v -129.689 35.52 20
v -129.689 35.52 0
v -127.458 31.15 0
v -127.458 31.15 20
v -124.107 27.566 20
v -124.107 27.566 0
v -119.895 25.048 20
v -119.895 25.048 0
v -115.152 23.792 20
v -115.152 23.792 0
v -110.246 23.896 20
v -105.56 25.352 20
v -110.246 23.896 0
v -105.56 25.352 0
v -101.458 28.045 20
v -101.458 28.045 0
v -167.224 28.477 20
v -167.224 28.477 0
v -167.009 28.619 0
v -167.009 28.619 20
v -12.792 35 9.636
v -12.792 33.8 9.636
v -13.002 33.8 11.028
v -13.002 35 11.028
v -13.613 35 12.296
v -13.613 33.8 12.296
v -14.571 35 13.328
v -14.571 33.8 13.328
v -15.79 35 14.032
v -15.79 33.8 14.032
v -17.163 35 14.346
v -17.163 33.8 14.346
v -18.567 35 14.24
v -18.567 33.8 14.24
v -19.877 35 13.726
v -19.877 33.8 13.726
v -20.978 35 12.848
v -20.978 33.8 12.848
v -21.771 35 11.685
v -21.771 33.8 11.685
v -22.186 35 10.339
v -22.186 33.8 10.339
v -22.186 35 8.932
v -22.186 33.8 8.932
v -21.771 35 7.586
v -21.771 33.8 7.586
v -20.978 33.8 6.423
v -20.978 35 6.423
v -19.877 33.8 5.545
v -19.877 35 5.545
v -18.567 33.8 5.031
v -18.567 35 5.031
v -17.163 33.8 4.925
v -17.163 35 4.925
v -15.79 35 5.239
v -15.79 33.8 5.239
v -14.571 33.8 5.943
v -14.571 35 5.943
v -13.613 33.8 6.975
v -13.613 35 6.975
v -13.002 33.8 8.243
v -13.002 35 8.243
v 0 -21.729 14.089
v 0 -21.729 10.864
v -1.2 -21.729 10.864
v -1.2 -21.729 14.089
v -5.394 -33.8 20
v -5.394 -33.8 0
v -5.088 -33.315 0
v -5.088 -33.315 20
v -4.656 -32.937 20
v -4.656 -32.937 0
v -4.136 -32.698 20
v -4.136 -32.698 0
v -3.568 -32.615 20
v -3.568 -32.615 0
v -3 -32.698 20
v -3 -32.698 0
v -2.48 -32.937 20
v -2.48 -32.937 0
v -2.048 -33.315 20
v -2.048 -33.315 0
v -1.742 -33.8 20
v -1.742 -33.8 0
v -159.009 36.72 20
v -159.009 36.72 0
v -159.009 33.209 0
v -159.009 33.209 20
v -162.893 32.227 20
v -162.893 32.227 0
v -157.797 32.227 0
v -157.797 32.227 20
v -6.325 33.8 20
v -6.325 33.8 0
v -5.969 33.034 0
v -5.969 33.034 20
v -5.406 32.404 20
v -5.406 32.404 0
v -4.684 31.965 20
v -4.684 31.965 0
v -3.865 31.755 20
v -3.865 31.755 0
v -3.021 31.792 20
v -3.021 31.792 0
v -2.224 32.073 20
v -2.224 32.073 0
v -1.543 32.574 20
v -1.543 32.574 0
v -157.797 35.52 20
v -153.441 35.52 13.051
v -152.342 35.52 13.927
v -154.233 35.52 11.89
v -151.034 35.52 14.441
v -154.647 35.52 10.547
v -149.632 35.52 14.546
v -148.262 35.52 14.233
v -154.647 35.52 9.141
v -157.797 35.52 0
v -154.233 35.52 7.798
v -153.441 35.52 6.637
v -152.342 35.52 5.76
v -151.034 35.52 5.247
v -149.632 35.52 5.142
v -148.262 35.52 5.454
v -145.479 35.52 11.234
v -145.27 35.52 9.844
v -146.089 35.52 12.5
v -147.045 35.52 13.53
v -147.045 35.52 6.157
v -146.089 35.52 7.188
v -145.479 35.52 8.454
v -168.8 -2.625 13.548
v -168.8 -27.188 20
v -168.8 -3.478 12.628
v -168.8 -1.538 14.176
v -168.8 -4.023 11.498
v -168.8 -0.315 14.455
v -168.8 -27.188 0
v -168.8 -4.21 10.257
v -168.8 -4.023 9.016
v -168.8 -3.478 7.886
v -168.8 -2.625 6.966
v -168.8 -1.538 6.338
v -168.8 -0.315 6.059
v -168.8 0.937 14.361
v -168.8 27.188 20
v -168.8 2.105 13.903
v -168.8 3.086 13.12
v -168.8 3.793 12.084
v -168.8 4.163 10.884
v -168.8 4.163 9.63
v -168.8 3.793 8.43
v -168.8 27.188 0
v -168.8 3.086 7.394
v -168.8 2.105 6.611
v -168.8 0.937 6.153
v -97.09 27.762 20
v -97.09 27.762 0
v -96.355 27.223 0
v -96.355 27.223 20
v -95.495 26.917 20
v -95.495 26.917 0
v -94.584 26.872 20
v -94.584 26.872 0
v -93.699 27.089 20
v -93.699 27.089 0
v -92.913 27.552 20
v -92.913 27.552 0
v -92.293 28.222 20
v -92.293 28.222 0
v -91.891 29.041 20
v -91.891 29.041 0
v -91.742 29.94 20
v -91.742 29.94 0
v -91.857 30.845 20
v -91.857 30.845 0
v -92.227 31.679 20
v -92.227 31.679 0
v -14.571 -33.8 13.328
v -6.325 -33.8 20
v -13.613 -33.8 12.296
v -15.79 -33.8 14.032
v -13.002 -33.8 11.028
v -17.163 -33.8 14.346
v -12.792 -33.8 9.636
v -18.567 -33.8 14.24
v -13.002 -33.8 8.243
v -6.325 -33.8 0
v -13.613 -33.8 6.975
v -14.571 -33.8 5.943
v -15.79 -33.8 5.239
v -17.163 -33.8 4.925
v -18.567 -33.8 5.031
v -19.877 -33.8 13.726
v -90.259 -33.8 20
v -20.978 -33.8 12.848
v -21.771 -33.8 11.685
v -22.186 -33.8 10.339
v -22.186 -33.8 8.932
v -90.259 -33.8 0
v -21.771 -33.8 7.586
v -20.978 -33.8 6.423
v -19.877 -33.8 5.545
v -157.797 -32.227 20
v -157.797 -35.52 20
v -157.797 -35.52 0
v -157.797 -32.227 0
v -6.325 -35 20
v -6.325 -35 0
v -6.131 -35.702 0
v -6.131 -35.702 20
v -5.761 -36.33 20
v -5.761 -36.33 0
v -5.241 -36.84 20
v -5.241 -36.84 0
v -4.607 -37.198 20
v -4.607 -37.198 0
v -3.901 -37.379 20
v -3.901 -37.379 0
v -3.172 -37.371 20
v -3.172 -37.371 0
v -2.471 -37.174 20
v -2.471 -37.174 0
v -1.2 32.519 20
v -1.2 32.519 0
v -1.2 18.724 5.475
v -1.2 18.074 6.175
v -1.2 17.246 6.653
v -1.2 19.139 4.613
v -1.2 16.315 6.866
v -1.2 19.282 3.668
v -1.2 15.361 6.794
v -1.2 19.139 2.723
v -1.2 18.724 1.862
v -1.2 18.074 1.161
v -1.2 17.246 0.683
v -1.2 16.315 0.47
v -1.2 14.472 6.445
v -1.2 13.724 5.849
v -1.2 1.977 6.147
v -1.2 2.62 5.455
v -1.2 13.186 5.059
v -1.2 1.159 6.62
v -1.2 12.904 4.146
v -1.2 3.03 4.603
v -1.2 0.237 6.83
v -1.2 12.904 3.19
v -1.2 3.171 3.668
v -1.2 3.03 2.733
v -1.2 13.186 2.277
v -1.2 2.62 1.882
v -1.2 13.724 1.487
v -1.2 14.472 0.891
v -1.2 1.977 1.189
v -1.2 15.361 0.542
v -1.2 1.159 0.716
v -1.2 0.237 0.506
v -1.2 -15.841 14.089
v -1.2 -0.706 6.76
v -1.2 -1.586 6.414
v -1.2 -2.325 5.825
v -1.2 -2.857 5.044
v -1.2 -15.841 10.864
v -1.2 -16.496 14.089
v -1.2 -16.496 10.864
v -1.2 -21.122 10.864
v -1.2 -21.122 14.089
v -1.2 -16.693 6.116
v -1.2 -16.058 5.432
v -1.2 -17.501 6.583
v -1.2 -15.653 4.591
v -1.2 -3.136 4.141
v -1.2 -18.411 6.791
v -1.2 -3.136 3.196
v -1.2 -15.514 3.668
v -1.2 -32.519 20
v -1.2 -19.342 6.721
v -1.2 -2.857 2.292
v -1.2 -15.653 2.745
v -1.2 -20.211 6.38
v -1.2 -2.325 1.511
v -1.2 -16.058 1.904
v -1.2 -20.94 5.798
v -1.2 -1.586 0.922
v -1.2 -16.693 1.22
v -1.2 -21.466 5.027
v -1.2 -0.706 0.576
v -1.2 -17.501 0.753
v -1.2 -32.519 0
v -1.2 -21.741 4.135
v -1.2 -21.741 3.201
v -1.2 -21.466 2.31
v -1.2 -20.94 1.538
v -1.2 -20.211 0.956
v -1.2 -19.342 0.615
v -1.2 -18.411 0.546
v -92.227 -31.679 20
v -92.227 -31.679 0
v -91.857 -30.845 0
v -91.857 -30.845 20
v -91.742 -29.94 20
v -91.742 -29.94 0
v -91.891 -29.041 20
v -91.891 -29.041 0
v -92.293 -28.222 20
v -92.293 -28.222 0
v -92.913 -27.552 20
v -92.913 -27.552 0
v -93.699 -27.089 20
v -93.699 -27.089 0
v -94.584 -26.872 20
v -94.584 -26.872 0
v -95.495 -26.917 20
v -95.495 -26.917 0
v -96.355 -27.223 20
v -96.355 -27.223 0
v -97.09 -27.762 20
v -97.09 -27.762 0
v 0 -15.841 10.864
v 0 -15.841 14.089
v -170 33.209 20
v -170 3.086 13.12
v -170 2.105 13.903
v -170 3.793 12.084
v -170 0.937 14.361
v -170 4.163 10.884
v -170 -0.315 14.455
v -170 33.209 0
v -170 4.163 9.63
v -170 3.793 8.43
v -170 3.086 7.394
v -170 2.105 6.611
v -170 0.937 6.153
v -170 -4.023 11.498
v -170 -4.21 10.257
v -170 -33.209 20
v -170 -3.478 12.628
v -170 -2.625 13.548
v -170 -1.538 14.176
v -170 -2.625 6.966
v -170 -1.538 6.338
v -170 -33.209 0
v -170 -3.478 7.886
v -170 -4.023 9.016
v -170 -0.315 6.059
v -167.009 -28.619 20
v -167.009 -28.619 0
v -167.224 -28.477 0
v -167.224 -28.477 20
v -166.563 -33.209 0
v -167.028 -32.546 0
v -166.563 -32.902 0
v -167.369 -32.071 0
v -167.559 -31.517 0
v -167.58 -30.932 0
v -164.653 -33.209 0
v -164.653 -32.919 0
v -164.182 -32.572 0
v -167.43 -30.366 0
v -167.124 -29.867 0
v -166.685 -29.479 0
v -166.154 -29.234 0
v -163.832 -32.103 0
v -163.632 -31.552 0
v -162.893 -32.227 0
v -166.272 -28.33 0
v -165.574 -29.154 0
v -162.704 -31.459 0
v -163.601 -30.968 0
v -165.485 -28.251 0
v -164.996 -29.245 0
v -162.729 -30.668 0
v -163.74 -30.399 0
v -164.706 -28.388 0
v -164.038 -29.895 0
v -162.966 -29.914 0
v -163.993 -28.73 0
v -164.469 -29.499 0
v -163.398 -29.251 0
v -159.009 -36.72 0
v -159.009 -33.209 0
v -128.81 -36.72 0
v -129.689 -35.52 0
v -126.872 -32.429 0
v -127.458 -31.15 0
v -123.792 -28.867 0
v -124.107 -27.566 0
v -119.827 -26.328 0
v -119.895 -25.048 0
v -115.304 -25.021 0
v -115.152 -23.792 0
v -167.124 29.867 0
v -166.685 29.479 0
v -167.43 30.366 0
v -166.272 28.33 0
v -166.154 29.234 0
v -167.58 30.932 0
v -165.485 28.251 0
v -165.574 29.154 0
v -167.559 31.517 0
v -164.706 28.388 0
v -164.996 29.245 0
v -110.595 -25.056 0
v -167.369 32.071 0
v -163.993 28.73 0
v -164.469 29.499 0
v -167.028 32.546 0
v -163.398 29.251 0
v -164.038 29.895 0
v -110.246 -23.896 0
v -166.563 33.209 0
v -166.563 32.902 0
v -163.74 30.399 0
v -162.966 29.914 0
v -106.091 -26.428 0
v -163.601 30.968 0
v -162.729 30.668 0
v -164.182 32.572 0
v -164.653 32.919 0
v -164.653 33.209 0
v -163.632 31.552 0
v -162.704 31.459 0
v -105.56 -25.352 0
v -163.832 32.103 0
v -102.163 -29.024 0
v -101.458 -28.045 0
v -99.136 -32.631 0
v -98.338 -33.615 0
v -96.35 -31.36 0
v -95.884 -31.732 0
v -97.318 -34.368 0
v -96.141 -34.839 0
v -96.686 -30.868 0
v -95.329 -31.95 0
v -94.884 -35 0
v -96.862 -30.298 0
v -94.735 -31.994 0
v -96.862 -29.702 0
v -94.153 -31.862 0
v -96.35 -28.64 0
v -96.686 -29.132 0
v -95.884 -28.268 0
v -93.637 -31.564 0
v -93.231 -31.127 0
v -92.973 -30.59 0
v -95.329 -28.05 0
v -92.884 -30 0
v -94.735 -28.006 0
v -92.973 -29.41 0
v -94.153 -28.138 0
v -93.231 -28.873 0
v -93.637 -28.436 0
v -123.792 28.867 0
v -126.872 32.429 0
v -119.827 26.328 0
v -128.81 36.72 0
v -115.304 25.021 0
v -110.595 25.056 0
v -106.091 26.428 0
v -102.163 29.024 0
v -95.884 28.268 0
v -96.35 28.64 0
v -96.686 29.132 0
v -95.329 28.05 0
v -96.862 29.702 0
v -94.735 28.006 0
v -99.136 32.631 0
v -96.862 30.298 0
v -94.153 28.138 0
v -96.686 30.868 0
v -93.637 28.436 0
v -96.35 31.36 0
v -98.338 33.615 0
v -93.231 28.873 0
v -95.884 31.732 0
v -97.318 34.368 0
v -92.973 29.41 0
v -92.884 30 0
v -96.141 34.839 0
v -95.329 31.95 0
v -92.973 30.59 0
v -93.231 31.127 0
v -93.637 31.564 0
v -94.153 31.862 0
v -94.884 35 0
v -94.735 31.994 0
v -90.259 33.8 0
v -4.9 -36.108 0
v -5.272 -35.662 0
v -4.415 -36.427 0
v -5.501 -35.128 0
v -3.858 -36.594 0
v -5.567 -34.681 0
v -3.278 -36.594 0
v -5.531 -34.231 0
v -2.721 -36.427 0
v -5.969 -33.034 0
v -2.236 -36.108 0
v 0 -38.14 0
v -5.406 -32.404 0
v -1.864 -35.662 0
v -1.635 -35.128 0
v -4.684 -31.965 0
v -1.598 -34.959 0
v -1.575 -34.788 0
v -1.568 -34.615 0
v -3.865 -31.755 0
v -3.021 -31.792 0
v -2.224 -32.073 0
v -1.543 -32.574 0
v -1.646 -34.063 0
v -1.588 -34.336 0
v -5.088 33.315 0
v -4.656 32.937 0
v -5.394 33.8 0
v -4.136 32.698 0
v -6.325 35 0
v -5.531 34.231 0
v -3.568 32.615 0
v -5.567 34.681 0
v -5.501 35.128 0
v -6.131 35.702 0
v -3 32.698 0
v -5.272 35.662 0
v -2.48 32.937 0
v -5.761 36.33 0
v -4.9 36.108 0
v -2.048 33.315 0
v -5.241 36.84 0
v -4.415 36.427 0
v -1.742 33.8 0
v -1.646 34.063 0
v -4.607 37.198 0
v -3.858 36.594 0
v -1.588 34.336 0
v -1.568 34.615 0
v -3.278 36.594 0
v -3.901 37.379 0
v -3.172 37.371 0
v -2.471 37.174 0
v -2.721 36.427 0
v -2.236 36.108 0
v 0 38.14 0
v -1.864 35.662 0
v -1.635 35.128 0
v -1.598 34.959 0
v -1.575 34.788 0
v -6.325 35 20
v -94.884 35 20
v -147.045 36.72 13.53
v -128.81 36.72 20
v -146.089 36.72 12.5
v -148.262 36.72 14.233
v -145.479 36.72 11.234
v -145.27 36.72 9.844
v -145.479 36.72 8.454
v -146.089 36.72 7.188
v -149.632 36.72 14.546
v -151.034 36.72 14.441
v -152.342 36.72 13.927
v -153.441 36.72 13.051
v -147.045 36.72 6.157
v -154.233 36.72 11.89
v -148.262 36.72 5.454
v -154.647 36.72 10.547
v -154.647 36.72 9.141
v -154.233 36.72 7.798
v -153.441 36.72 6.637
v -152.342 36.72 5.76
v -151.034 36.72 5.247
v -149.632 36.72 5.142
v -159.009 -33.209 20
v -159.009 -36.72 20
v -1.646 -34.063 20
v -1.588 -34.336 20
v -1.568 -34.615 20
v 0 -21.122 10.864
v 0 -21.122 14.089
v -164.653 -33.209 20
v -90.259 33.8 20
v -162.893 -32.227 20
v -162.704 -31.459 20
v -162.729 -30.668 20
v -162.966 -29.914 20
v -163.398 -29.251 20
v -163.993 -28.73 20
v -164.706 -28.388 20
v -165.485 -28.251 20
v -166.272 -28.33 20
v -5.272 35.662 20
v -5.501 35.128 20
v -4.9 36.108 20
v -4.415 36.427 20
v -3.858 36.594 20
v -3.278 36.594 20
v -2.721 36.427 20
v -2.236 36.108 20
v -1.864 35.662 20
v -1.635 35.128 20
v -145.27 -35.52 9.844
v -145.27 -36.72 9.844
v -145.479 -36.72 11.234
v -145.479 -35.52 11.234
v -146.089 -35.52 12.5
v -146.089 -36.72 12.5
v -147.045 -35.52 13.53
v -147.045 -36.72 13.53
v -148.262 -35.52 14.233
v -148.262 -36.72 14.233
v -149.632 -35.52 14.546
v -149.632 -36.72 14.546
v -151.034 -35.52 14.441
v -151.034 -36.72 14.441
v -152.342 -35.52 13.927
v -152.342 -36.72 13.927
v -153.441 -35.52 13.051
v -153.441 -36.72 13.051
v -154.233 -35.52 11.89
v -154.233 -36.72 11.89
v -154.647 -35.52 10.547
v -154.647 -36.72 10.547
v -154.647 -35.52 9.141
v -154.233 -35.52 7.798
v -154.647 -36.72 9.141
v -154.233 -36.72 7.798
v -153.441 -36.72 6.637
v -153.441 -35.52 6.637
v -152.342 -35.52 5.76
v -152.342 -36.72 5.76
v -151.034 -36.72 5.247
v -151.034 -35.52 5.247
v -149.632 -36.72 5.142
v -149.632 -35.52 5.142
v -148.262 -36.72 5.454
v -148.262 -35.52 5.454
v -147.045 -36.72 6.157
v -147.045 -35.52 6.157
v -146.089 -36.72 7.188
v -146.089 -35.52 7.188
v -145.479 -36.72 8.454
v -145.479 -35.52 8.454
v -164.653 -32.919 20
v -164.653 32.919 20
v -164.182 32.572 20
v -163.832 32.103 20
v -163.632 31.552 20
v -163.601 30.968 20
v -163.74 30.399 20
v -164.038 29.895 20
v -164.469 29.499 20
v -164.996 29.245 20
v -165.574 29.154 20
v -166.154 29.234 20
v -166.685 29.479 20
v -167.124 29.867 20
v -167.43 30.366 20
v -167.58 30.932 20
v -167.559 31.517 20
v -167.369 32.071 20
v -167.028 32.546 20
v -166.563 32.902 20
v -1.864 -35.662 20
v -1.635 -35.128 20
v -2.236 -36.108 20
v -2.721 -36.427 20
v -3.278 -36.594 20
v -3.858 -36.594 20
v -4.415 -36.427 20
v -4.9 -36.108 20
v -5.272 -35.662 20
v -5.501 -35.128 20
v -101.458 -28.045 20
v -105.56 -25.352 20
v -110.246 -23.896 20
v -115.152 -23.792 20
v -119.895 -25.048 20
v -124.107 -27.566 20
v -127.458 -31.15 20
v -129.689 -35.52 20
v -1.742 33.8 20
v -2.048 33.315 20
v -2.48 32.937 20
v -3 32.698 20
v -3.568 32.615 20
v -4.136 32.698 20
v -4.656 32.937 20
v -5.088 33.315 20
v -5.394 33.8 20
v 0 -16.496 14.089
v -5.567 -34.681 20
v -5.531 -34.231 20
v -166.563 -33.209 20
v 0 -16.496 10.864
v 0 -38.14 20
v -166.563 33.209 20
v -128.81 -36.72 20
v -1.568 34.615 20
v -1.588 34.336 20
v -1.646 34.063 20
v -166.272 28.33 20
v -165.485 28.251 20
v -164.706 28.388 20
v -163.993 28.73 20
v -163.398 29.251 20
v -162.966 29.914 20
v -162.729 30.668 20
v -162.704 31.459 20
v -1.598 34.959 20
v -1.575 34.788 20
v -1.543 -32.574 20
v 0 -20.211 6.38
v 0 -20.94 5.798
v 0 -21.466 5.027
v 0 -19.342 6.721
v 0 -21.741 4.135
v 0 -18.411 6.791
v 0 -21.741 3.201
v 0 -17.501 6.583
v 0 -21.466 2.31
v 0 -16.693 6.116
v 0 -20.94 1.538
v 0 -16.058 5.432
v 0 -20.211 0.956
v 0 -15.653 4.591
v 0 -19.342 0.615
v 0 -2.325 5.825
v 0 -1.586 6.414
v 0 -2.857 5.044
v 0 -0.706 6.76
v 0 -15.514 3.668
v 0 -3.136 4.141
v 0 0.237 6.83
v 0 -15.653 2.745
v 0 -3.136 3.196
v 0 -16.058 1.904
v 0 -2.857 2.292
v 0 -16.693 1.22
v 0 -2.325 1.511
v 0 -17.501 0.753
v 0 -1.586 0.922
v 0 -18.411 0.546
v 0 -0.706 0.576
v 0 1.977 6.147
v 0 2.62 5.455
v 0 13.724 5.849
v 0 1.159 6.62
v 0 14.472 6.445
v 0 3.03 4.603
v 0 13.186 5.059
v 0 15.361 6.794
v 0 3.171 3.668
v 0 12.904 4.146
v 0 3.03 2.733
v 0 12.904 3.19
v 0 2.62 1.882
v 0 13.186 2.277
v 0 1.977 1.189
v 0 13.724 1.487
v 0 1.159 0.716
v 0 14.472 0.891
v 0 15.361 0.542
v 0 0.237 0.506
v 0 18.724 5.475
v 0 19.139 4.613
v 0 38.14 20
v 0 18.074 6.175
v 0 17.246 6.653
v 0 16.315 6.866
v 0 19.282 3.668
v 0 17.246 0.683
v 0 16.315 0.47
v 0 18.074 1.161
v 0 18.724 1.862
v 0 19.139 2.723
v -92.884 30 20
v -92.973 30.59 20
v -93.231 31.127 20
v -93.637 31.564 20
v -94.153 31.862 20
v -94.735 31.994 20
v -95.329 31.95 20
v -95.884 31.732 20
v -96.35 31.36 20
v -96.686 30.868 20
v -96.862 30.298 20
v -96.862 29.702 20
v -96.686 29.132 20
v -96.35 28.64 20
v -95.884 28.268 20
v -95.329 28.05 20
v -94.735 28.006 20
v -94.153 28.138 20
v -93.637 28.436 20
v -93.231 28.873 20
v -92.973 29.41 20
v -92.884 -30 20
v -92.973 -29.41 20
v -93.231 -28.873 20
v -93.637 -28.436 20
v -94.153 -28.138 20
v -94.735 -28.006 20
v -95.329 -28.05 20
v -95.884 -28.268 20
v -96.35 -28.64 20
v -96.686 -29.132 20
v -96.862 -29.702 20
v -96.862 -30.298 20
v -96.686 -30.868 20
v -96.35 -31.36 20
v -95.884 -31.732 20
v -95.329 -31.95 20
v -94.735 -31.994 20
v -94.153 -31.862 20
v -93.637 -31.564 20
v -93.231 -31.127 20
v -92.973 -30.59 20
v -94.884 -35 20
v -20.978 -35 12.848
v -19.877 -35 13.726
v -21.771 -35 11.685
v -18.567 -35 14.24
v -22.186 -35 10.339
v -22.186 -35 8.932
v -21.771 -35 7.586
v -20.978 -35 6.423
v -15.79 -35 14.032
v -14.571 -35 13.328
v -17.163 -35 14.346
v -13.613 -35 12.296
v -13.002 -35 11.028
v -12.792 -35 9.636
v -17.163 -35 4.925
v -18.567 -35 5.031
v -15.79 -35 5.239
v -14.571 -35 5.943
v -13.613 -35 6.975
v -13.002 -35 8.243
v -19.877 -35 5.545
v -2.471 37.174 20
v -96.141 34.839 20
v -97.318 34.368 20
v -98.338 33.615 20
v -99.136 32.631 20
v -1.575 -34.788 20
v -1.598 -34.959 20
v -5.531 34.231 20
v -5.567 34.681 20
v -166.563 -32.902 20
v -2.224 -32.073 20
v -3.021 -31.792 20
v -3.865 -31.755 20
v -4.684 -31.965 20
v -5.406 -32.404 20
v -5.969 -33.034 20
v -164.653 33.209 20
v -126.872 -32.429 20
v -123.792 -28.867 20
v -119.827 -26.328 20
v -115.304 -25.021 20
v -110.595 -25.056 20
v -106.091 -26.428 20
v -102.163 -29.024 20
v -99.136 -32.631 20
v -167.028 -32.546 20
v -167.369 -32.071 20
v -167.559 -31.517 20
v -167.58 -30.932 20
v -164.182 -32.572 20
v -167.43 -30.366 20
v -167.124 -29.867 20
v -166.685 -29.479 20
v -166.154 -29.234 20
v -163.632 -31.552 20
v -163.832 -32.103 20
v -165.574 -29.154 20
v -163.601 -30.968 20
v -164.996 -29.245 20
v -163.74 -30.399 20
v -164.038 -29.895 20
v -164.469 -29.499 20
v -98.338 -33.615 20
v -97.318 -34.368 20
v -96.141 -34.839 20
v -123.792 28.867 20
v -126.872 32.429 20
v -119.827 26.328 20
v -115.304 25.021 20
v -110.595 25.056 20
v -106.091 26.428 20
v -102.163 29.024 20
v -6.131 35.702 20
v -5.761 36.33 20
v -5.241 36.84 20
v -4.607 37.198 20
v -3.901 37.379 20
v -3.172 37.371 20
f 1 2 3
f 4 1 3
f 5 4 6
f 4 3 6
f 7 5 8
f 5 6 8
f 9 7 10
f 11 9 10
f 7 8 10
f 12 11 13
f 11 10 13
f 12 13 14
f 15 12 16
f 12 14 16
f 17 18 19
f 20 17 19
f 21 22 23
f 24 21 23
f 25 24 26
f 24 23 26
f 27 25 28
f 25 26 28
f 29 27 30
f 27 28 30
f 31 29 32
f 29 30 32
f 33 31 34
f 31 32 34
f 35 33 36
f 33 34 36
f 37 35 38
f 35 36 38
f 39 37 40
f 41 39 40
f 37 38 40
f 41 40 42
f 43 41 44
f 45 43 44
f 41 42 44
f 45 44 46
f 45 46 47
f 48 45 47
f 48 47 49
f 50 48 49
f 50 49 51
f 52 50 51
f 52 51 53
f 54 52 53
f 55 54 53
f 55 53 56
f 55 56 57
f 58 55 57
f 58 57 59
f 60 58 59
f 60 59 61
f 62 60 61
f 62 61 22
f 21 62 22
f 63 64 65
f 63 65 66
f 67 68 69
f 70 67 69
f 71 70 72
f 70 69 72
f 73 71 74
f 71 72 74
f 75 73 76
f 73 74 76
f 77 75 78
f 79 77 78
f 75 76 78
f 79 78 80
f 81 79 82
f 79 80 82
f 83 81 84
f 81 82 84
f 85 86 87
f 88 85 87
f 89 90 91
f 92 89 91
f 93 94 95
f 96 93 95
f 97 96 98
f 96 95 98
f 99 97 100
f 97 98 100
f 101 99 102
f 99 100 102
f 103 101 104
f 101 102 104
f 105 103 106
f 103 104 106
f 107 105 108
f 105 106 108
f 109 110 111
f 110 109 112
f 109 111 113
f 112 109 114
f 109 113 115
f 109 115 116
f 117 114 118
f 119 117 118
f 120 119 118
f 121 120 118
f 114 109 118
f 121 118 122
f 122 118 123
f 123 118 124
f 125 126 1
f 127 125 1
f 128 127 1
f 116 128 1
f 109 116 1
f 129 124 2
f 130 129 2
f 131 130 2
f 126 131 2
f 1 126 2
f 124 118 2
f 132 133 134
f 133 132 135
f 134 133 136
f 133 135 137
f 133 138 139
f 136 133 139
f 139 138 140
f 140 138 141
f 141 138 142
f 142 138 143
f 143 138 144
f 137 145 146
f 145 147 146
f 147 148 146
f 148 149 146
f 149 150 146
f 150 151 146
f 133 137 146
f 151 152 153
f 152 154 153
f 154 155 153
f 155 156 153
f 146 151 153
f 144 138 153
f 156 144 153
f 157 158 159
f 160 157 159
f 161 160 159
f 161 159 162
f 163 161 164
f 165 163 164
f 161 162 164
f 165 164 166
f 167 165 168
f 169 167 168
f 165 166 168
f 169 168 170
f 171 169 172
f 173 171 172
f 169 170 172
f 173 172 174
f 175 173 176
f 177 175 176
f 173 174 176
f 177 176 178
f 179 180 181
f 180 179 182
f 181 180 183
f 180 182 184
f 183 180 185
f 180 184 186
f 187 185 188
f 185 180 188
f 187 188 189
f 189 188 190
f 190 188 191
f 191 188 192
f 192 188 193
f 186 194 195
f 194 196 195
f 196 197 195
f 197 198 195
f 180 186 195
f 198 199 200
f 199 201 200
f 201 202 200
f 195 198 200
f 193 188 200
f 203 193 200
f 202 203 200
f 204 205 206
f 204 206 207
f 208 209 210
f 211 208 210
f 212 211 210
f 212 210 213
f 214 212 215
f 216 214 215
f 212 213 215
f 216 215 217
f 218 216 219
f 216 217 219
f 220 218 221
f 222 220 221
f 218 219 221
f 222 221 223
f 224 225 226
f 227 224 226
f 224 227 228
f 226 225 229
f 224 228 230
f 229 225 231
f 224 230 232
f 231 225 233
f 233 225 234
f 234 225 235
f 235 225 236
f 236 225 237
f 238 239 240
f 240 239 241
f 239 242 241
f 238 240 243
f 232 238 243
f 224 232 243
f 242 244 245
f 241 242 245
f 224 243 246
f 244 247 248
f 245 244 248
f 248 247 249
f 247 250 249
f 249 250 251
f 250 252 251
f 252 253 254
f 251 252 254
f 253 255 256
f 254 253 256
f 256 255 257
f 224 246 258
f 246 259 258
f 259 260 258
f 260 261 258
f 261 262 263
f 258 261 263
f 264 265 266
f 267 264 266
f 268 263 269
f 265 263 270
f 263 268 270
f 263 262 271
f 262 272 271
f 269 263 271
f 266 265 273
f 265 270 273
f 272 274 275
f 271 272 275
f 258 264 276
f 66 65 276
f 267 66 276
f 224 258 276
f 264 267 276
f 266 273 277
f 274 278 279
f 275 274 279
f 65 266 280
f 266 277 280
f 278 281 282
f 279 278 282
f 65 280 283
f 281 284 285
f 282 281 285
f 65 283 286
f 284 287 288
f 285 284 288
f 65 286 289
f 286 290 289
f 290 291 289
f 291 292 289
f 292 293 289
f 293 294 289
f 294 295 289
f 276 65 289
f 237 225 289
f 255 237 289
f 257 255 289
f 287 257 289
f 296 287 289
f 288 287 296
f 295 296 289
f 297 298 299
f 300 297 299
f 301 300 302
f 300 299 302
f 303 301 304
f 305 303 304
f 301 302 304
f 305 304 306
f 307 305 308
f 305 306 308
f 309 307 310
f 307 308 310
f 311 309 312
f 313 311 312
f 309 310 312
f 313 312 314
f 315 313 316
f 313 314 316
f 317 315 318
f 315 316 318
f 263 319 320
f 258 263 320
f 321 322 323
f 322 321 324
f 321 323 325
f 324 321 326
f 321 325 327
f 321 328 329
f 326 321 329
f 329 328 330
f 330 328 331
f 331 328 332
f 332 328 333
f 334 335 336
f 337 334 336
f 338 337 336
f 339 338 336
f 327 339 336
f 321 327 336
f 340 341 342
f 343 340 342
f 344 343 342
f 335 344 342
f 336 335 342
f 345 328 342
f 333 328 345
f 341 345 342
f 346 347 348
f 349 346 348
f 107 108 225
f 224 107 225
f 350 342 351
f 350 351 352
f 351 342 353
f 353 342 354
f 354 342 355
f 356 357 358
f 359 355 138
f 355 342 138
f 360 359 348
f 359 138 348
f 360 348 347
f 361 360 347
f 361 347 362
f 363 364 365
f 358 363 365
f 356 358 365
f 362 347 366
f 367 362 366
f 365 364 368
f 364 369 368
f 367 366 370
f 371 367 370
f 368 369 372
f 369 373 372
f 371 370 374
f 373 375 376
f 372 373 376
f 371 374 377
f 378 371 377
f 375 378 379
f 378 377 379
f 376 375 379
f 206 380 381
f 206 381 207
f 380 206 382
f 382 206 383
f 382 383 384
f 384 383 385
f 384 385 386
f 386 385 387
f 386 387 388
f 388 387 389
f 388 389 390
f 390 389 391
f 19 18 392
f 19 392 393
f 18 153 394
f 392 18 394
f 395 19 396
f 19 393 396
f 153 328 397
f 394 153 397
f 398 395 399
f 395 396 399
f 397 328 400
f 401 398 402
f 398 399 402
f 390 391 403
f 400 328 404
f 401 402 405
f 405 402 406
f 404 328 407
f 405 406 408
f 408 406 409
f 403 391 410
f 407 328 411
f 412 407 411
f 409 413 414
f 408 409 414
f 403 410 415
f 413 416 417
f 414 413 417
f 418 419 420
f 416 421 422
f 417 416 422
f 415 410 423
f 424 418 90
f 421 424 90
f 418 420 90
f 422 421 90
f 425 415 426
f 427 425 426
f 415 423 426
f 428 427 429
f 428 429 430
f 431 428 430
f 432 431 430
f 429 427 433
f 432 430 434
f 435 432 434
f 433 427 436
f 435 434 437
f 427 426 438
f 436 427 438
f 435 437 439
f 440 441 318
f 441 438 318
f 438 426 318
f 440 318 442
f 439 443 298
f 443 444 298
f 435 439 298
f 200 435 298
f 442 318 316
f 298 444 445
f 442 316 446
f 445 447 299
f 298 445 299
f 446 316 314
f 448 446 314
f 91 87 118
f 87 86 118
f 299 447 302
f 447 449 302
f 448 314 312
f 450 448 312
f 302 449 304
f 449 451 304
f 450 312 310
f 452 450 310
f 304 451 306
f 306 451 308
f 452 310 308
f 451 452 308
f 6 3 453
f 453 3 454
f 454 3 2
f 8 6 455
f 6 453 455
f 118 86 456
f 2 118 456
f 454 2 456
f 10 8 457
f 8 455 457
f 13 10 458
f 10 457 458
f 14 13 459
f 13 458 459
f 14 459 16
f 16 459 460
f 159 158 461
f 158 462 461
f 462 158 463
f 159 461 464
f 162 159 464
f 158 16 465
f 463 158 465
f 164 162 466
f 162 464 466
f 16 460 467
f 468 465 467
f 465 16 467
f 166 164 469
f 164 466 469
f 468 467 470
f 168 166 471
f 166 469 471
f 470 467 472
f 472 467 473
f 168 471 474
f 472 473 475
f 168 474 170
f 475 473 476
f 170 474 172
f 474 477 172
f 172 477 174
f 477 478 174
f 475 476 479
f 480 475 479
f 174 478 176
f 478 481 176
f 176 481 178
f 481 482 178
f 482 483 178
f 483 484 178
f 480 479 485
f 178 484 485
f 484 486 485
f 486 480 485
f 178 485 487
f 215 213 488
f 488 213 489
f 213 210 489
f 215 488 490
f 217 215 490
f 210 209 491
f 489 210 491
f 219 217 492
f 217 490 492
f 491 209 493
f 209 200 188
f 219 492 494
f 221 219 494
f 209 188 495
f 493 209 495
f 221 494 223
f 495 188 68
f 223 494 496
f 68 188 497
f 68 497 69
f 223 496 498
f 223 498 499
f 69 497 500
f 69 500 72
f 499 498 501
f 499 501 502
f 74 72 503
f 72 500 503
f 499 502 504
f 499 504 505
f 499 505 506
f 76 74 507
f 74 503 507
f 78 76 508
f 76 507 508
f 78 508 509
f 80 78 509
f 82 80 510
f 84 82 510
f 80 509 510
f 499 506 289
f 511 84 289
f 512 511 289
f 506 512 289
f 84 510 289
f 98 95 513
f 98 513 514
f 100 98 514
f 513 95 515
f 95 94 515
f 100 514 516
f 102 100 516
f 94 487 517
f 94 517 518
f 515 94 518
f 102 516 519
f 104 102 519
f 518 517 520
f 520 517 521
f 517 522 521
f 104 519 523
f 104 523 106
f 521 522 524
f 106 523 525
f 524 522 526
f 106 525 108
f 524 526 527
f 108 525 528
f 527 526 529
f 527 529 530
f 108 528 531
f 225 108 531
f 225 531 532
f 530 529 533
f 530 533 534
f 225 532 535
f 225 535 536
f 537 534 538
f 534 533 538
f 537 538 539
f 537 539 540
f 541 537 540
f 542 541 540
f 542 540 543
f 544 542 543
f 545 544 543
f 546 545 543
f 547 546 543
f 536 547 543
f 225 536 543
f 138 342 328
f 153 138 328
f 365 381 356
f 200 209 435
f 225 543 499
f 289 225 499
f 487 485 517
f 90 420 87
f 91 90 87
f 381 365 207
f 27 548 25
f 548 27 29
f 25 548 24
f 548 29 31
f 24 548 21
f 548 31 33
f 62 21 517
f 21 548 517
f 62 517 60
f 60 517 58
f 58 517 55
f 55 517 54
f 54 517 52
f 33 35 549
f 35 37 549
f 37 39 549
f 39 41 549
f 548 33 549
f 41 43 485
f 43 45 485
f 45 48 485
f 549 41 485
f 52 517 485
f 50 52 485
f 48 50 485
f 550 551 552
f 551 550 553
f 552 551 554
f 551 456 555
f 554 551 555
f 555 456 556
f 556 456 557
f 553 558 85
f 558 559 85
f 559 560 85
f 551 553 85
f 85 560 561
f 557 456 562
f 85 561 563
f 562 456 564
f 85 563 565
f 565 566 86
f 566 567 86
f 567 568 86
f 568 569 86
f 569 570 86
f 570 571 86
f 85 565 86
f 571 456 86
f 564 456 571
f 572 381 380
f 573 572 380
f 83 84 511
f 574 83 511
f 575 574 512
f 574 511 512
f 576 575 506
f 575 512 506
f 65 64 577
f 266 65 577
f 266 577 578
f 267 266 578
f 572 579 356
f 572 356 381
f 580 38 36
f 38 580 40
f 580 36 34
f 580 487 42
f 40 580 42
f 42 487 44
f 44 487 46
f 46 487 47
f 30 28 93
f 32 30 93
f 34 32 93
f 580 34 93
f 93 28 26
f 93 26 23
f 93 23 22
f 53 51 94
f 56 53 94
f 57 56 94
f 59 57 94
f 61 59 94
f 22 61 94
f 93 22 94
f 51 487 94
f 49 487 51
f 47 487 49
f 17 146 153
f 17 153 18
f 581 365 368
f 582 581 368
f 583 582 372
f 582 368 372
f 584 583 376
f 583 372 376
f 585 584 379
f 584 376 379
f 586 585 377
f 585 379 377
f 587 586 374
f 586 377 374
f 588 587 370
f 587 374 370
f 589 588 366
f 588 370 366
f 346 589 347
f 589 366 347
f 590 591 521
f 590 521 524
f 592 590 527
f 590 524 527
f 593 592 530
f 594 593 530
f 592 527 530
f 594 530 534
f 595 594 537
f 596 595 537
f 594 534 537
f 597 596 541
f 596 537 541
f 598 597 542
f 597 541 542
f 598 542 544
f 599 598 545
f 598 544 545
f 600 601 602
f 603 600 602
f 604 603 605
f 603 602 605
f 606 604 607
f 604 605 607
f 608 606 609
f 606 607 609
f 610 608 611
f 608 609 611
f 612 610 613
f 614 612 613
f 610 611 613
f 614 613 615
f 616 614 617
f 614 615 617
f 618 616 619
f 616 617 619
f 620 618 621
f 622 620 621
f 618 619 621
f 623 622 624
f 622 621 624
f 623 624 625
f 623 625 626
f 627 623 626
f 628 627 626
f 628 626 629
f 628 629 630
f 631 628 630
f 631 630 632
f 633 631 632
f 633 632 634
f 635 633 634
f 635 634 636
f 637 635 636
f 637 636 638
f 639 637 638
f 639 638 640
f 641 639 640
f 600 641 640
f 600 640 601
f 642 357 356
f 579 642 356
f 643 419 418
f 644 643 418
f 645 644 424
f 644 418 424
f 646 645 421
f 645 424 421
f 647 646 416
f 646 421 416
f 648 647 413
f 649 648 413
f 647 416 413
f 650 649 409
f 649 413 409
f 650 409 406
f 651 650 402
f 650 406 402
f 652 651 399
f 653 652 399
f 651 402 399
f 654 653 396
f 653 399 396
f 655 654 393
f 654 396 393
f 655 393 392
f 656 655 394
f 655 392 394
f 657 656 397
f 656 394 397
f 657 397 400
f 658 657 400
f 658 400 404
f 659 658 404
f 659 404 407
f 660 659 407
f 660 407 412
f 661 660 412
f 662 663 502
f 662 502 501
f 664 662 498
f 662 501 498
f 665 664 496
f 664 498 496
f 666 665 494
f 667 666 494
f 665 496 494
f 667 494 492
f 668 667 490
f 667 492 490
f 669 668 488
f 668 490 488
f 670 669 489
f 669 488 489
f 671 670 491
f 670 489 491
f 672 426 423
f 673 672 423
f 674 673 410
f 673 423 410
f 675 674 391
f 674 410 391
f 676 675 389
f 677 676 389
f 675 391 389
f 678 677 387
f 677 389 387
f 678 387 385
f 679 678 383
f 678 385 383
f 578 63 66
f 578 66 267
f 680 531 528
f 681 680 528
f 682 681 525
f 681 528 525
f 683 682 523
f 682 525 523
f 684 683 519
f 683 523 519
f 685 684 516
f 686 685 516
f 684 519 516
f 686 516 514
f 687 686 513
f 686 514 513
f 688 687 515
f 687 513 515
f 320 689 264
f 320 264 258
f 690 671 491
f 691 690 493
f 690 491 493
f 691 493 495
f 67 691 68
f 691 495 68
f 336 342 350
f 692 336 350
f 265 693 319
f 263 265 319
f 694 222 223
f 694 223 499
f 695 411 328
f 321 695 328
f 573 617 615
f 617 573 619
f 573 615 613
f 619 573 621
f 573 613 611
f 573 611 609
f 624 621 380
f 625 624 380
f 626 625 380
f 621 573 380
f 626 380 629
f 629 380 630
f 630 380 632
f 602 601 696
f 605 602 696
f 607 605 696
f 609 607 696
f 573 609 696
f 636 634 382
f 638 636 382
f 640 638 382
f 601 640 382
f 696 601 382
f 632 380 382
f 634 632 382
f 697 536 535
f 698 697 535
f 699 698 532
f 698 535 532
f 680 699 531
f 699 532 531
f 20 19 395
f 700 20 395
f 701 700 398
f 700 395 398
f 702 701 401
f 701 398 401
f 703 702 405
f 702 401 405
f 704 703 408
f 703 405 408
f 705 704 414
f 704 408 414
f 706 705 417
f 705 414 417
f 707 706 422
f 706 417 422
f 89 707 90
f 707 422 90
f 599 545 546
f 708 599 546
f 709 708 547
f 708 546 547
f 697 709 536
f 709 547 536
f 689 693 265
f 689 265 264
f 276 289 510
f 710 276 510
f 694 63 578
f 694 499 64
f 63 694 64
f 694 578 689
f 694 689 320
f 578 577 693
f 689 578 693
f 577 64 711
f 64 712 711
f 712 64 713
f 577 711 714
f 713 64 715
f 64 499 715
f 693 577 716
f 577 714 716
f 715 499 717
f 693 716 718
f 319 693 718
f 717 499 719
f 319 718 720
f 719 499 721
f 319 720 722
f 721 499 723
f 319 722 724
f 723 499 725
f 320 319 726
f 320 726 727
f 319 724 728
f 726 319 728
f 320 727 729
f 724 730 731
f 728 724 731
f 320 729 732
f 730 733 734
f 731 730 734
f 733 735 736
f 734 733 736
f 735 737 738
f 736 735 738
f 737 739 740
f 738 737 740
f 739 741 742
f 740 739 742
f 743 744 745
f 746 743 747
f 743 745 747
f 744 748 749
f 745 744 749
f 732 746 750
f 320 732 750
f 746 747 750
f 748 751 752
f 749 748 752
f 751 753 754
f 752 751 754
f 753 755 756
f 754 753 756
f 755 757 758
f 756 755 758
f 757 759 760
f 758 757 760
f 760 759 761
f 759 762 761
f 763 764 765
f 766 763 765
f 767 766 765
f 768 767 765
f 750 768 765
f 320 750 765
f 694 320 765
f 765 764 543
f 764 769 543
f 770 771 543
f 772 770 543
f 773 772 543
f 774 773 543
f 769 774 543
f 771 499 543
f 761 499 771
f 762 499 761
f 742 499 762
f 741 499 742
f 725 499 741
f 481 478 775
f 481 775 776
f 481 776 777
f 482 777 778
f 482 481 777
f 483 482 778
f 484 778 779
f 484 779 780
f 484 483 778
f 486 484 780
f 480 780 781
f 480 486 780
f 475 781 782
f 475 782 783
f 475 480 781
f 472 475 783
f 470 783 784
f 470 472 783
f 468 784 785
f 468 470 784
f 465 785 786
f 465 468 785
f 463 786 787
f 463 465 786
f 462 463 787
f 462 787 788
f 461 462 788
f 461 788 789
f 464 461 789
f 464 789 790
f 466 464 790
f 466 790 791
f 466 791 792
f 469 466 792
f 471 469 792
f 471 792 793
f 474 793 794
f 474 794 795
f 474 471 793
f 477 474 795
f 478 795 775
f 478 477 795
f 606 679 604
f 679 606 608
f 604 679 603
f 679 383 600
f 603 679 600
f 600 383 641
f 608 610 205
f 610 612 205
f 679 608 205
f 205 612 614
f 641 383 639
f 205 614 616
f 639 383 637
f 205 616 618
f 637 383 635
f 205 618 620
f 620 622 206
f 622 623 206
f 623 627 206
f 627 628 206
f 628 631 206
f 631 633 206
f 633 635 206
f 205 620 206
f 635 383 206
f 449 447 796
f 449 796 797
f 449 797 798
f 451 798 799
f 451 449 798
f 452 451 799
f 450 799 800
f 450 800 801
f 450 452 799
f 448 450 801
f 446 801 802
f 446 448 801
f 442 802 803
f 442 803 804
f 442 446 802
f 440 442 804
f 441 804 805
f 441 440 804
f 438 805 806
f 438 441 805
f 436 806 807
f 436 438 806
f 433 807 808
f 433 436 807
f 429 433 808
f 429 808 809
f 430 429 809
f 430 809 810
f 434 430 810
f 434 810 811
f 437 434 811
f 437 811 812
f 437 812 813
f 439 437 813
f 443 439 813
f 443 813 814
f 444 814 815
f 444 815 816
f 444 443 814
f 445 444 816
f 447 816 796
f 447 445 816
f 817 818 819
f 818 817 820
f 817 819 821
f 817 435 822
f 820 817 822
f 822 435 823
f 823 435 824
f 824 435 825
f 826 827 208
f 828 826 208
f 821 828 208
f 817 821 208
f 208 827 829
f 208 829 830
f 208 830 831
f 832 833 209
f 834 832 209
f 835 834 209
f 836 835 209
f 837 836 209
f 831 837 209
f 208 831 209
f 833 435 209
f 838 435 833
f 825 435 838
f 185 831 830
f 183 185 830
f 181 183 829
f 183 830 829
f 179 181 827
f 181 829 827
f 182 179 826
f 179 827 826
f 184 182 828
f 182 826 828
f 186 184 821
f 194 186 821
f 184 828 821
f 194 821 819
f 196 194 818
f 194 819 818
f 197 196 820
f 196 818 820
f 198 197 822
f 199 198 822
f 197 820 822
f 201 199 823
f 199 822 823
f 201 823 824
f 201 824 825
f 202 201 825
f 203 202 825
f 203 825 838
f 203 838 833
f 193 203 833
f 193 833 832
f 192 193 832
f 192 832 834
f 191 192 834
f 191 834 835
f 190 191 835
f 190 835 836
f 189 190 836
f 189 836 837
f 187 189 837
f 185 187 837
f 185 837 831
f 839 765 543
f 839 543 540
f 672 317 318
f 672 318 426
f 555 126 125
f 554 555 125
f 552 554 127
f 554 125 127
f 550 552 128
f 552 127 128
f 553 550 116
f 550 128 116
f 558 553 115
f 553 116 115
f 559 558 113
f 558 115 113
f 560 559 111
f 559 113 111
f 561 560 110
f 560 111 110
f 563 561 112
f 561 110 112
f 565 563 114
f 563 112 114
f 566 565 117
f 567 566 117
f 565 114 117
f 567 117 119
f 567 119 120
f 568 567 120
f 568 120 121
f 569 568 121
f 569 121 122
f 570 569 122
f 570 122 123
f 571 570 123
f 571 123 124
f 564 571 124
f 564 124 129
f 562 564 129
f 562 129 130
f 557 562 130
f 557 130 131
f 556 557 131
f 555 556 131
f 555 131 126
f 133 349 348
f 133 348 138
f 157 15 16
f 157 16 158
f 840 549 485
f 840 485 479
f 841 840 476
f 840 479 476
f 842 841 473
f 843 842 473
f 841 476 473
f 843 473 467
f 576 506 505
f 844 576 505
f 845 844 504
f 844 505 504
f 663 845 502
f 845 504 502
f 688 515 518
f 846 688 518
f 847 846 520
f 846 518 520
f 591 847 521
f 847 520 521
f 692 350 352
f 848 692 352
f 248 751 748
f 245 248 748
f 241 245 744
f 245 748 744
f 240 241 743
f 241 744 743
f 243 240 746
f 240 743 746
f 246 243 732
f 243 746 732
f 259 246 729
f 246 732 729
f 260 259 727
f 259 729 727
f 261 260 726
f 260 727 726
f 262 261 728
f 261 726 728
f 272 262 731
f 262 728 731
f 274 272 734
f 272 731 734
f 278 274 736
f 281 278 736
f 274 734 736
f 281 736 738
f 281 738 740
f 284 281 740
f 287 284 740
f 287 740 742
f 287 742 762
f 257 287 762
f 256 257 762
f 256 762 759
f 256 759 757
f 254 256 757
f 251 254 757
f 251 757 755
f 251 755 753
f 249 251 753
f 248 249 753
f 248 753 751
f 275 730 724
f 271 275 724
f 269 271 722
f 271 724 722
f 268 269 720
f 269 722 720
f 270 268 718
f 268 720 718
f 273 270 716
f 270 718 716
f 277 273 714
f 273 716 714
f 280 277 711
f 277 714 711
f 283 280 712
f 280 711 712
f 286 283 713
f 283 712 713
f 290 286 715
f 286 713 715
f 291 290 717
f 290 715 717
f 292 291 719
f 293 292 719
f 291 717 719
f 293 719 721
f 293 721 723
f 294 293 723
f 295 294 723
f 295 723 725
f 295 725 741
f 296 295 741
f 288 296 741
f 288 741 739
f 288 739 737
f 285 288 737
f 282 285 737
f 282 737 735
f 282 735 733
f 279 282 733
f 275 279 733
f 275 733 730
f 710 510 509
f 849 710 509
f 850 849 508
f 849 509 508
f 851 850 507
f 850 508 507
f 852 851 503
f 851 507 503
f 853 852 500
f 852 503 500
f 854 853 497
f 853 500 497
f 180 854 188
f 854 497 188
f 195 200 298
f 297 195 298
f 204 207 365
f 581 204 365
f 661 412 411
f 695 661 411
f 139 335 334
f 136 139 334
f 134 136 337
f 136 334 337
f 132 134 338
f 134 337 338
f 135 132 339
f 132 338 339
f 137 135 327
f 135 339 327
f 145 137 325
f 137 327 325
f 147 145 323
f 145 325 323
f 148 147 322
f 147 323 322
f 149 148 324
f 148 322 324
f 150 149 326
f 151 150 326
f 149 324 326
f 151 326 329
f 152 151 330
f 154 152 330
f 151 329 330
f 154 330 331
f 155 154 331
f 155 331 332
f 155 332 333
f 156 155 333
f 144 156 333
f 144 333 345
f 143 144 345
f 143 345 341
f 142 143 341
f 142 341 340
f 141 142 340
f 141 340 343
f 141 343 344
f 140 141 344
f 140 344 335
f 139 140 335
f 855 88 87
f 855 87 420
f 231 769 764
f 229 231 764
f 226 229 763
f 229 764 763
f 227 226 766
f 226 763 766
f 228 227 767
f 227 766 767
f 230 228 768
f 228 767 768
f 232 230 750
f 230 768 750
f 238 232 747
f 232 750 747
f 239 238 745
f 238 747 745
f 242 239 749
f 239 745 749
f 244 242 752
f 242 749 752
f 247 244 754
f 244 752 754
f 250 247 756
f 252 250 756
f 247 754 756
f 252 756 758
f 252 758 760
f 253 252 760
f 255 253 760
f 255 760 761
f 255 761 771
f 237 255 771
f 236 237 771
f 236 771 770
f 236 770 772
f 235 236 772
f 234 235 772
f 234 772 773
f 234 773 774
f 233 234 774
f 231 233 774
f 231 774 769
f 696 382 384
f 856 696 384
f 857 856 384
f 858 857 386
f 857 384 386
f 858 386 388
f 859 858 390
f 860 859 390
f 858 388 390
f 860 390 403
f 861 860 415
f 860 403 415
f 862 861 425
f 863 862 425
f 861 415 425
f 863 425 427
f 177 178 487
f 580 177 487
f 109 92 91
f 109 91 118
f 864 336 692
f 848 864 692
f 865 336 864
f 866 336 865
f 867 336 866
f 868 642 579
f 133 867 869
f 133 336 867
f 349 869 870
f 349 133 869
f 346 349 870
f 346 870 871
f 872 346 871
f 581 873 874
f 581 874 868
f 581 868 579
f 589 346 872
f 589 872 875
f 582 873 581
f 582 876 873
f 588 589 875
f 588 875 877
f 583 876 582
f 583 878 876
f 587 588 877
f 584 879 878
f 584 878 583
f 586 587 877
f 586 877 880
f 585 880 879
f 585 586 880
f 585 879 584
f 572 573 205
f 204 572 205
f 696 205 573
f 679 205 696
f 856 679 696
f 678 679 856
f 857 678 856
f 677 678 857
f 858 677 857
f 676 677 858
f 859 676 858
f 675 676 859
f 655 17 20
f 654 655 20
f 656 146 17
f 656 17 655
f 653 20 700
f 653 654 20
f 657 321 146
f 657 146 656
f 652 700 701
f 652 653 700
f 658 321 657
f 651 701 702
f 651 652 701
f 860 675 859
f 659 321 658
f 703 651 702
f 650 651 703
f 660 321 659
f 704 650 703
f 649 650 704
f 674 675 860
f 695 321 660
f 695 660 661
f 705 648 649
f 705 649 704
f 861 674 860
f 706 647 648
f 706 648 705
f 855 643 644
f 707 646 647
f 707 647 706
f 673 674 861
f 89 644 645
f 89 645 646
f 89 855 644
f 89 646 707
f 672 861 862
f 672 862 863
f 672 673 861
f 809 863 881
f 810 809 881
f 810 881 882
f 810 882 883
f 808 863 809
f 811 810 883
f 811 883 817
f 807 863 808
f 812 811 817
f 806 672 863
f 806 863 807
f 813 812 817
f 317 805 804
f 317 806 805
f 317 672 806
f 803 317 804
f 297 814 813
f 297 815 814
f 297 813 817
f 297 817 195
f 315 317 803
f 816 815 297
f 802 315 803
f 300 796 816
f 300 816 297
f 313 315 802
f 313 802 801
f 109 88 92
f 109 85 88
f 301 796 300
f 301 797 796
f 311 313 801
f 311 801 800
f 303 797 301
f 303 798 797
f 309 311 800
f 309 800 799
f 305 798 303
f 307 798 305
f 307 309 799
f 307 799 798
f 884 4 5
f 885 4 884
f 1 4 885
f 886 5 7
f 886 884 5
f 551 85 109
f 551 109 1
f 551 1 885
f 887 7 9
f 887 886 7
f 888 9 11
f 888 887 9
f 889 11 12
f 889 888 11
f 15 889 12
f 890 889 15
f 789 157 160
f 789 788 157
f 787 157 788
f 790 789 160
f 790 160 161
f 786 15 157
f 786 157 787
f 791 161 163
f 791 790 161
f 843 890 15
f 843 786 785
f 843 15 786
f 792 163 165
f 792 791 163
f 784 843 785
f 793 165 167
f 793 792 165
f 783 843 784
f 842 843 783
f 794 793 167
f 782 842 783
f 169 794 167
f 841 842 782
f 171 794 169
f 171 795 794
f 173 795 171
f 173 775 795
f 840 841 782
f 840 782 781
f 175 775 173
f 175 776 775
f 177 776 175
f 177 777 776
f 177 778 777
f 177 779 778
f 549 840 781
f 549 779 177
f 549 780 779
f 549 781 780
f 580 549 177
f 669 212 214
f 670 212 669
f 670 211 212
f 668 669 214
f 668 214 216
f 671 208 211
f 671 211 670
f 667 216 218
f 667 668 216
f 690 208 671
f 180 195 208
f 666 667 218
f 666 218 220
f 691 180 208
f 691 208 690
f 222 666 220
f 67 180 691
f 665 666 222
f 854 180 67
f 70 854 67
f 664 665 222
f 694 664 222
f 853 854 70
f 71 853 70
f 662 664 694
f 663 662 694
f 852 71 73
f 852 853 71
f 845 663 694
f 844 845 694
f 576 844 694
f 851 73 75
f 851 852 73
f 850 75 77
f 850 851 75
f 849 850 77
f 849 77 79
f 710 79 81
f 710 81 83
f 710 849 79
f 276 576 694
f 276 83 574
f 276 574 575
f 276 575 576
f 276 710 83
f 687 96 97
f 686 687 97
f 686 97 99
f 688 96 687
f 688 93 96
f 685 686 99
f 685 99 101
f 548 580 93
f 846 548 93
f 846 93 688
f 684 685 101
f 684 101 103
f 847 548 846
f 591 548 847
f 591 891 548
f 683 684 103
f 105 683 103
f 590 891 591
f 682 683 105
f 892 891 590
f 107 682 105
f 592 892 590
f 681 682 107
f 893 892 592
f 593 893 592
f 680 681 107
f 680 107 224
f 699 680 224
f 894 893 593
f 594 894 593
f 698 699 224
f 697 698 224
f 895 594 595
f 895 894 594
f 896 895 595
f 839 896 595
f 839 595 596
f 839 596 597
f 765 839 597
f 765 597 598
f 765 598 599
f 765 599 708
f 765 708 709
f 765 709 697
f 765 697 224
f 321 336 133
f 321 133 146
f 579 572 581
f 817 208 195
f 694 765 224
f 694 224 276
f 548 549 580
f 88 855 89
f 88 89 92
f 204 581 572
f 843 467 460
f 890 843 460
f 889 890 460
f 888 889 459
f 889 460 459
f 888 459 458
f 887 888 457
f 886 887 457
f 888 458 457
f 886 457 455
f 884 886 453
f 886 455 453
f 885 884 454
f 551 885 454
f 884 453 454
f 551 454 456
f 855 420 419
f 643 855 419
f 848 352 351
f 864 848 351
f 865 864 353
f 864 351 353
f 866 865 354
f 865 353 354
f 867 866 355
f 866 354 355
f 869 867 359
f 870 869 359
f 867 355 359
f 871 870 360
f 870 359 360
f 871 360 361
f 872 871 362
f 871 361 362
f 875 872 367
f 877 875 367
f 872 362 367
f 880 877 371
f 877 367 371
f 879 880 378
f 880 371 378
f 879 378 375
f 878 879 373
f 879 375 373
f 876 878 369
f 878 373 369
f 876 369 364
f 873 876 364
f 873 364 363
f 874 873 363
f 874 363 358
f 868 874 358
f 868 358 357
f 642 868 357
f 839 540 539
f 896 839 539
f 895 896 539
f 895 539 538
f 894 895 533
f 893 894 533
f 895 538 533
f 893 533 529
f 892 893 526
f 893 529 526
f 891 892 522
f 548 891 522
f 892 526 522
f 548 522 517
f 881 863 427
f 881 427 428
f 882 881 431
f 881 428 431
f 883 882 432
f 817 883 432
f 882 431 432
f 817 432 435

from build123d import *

# Parameters (mm, degrees)
F0_R     = 2
F1_DEPTH = 20
F2_R     = 4.7152449582
F2_R_2   = 4.7232891339
F3_DEPTH = 108
F4_R     = 4.2098088582
F5_DEPTH = 25
F6_R     = 3.1711780618
F6_R_2   = 3.2066806009
F6_R_3   = 3.1312270379
F6_W     = 0.6074849516
F6_H     = 3.2243365422
F6_W_2   = 0.6542131305
F7_DEPTH = 25


# Not quite as in the source:
# - a feature names something its author has since deleted; it is built from what else it names


with BuildPart() as f1:
    # F0 (on Top) → F1 (new body)
    with BuildSketch(Plane.XY):
        with BuildLine():
            Line((-164.65269916, 33.20941329), (-164.65269916, 32.9194632454))
            ThreePointArc((-164.65269916, 32.9194632454), (-165.5739976736, 29.1538786951), (-166.563206189, 32.902196247))
            Line((-166.563206189, 32.902196247), (-166.563206189, 33.20941329))
            Line((-166.563206189, 33.20941329), (-170, 33.20941329))
            Line((-170, 33.20941329), (-170, 0))
            Line((-170, 0), (-170, -33.20941329))
            Line((-170, -33.20941329), (-166.563206189, -33.20941329))
            Line((-166.563206189, -33.20941329), (-166.563206189, -32.902196247))
            ThreePointArc((-166.563206189, -32.902196247), (-165.5739976736, -29.1538786951), (-164.65269916, -32.9194632454))
            Line((-164.65269916, -32.9194632454), (-164.65269916, -33.20941329))
            Line((-164.65269916, -33.20941329), (-163.2265451578, -33.20941329))
            Line((-163.2265451578, -33.20941329), (-159.009280774, -33.20941329))
            Line((-159.009280774, -33.20941329), (-159.009280774, -36.7204154693))
            Line((-159.009280774, -36.7204154693), (-157.7970415085, -36.7204154693))
            Line((-157.7970415085, -36.7204154693), (-128.8103089121, -36.7204154693))
            ThreePointArc((-128.8103089121, -36.7204154693), (-115.3036395578, -25.0214683637), (-99.1359348061, -32.6307261124))
            ThreePointArc((-99.1359348061, -32.6307261124), (-97.3177205123, -34.3677013727), (-94.8839611325, -35))
            Line((-94.8839611325, -35), (-6.3253850676, -35))
            ThreePointArc((-6.3253850676, -35), (-4.9357568901, -37.0403297798), (-2.4707801799, -37.1741277646))
            Line((-2.4707801799, -37.1741277646), (0, -38.1401939384))
            Line((0, -38.1401939384), (0, -35))
            Line((0, -35), (0, 0))
            Line((0, 0), (0, 35))
            Line((0, 35), (0, 38.1401939384))
            Line((0, 38.1401939384), (-2.4707801799, 37.1741277646))
            ThreePointArc((-2.4707801799, 37.1741277646), (-4.9357568901, 37.0403297798), (-6.3253850676, 35))
            Line((-6.3253850676, 35), (-94.8839611325, 35))
            ThreePointArc((-94.8839611325, 35), (-97.3177205123, 34.3677013727), (-99.1359348061, 32.6307261124))
            ThreePointArc((-99.1359348061, 32.6307261124), (-115.3036395578, 25.0214683637), (-128.8103089121, 36.7204154693))
            Line((-128.8103089121, 36.7204154693), (-157.7970415085, 36.7204154693))
            Line((-157.7970415085, 36.7204154693), (-159.009280774, 36.7204154693))
            Line((-159.009280774, 36.7204154693), (-159.009280774, 33.20941329))
            Line((-159.009280774, 33.20941329), (-163.2265451578, 33.20941329))
            Line((-163.2265451578, 33.20941329), (-164.65269916, 33.20941329))
        make_face()
        with Locations((-94.8839611325, -30)):
            Circle(F0_R, mode=Mode.SUBTRACT)
        with BuildLine():
            ThreePointArc((-1.5680128924, -34.6153974533), (-1.5847981725, -34.8739692511), (-1.6348722671, -35.1282008489))
            ThreePointArc((-1.6348722671, -35.1282008489), (-3.5680128924, -36.6153974533), (-5.5011535178, -35.1282008489))
            ThreePointArc((-5.5011535178, -35.1282008489), (-5.561565475, -34.4549353061), (-5.3942458987, -33.8))
            ThreePointArc((-5.3942458987, -33.8), (-3.5680128924, -32.6153974533), (-1.7417798862, -33.8))
            ThreePointArc((-1.7417798862, -33.8), (-1.6119369721, -34.1985437695), (-1.5680128924, -34.6153974533))
        make_face(mode=Mode.SUBTRACT)
        with Locations((-94.8839611325, 30)):
            Circle(F0_R, mode=Mode.SUBTRACT)
        with BuildLine():
            Line((-1.5434729926, 32.5735324938), (-1.2, 32.5194895267))
            Line((-1.2, 32.5194895267), (-1.2, 0))
            Line((-1.2, 0), (-1.2, -32.5194895267))
            Line((-1.2, -32.5194895267), (-1.5434729926, -32.5735324938))
            ThreePointArc((-1.5434729926, -32.5735324938), (-4.2823772406, -31.8301402125), (-6.3253850676, -33.8))
            Line((-6.3253850676, -33.8), (-90.2593984932, -33.8))
            Line((-90.2593984932, -33.8), (-92.2271985619, -31.6787384118))
            ThreePointArc((-92.2271985619, -31.6787384118), (-92.912700117, -27.5524134293), (-97.0903228742, -27.7620281778))
            Line((-97.0903228742, -27.7620281778), (-101.4582490544, -28.045448372))
            ThreePointArc((-101.4582490544, -28.045448372), (-117.5672901619, -24.2537650751), (-129.6891982841, -35.5204154693))
            Line((-129.6891982841, -35.5204154693), (-155.884909603, -35.5204154693))
            Line((-155.884909603, -35.5204154693), (-157.7970415085, -35.5204154693))
            Line((-157.7970415085, -35.5204154693), (-157.7970415085, -32.2268303811))
            Line((-157.7970415085, -32.2268303811), (-162.8932879486, -32.2268303811))
            ThreePointArc((-162.8932879486, -32.2268303811), (-163.6774302758, -28.9699966079), (-167.0088434251, -28.6185256358))
            Line((-167.0088434251, -28.6185256358), (-167.2241950518, -28.4767444108))
            Line((-167.2241950518, -28.4767444108), (-168.8, -27.1884445101))
            Line((-168.8, -27.1884445101), (-168.8, 0))
            Line((-168.8, 0), (-168.8, 27.1884445101))
            Line((-168.8, 27.1884445101), (-167.2241950518, 28.4767444108))
            Line((-167.2241950518, 28.4767444108), (-167.0088434251, 28.6185256358))
            ThreePointArc((-167.0088434251, 28.6185256358), (-163.6774302758, 28.9699966079), (-162.8932879486, 32.2268303811))
            Line((-162.8932879486, 32.2268303811), (-157.7970415085, 32.2268303811))
            Line((-157.7970415085, 32.2268303811), (-157.7970415085, 35.5204154693))
            Line((-157.7970415085, 35.5204154693), (-155.884909603, 35.5204154693))
            Line((-155.884909603, 35.5204154693), (-129.6891982841, 35.5204154693))
            ThreePointArc((-129.6891982841, 35.5204154693), (-117.5672901619, 24.2537650751), (-101.4582490544, 28.045448372))
            Line((-101.4582490544, 28.045448372), (-97.0903228742, 27.7620281778))
            ThreePointArc((-97.0903228742, 27.7620281778), (-92.912700117, 27.5524134293), (-92.2271985619, 31.6787384118))
            Line((-92.2271985619, 31.6787384118), (-90.2593984932, 33.8))
            Line((-90.2593984932, 33.8), (-6.3253850676, 33.8))
            ThreePointArc((-6.3253850676, 33.8), (-4.2823772406, 31.8301402125), (-1.5434729926, 32.5735324938))
        make_face(mode=Mode.SUBTRACT)
        with BuildLine():
            ThreePointArc((-1.7417798862, 33.8), (-3.5680128924, 32.6153974533), (-5.3942458987, 33.8))
            ThreePointArc((-5.3942458987, 33.8), (-5.561565475, 34.4549353061), (-5.5011535178, 35.1282008489))
            ThreePointArc((-5.5011535178, 35.1282008489), (-3.5680128924, 36.6153974533), (-1.6348722671, 35.1282008489))
            ThreePointArc((-1.6348722671, 35.1282008489), (-1.5847981725, 34.8739692511), (-1.5680128924, 34.6153974533))
            ThreePointArc((-1.5680128924, 34.6153974533), (-1.6119369721, 34.1985437695), (-1.7417798862, 33.8))
        make_face(mode=Mode.SUBTRACT)
    extrude(amount=F1_DEPTH)

    # F2 (on face) → F3 (cut)
    with BuildSketch(Plane.XZ.offset(36.7204154693)):
        with Locations((-149.9848365784, 9.8437862471)):
            Circle(F2_R)
        with Locations((-17.5157543272, 9.6355015412)):
            Circle(F2_R_2)
    extrude(amount=-F3_DEPTH, mode=Mode.SUBTRACT)

    # F4 (on face) → F5 (cut)
    with BuildSketch(Plane(origin=(-170, 0, 0), x_dir=(0, -1, 0), z_dir=(-1, 0, 0))):
        with Locations((0, 10.2570122108)):
            Circle(F4_R)
    extrude(amount=-F5_DEPTH, mode=Mode.SUBTRACT)

    # F6 (on face) → F7 (cut)
    with BuildSketch(Plane.YZ):
        with Locations((0, 3.6681490019)):
            Circle(F6_R)
        with Locations((16.0749554634, 3.6681490019)):
            Circle(F6_R_2)
        with Locations((-18.6450798064, 3.6681490019)):
            Circle(F6_R_3)
        with Locations((-21.4254865423, 12.4766645022)):
            Rectangle(F6_W, F6_H)
        with Locations((-16.1684155464, 12.4766645022)):
            Rectangle(F6_W_2, F6_H)
    extrude(amount=-F7_DEPTH, mode=Mode.SUBTRACT)


solid = f1.part
